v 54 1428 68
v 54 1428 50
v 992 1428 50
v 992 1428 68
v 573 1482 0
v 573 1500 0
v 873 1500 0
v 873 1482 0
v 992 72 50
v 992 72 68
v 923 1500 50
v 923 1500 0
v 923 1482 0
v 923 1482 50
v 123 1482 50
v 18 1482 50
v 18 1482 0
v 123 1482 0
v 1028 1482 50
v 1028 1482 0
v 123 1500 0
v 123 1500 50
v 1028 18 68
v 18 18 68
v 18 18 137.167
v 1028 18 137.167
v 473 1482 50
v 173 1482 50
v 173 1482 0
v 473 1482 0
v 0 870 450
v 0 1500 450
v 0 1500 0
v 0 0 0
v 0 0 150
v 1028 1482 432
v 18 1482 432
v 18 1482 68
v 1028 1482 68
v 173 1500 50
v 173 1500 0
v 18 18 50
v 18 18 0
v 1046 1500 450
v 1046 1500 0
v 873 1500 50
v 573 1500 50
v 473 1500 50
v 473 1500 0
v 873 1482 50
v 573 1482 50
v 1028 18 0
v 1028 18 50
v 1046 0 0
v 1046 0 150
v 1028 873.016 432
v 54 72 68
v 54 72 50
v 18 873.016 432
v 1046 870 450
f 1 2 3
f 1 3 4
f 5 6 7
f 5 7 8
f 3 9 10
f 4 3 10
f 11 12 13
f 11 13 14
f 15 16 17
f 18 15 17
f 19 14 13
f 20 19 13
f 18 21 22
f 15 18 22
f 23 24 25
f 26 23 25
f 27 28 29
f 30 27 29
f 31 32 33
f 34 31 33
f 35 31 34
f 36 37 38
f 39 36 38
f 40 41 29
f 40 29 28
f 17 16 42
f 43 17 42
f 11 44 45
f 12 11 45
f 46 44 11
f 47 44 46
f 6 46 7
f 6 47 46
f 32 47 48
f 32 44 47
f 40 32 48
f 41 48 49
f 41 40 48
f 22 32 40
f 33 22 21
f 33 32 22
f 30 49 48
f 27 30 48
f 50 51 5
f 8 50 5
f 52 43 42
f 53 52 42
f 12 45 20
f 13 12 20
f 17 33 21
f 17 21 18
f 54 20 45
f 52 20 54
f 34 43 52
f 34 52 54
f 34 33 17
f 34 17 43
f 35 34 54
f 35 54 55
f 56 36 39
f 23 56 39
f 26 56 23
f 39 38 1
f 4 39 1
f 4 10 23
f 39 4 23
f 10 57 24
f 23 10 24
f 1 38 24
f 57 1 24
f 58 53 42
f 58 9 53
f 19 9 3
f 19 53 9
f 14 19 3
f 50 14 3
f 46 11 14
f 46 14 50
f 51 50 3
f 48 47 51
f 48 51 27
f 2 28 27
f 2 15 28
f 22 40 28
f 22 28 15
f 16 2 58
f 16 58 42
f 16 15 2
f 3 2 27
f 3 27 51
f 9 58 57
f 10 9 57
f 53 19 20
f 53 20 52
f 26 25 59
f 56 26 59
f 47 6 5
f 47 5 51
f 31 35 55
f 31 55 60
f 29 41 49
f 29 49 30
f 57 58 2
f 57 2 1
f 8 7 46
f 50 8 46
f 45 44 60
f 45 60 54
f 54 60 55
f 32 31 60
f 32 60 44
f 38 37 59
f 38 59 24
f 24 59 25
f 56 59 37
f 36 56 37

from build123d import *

# Parameters (mm, degrees)
PAD021_DEPTH    = 1046
THICKNESS001_T  = -18
SKETCH040_W     = 50
SKETCH040_H     = 50
SKETCH040_W_2   = 100
POCKET001_DEPTH = 18
SKETCH048_W     = 36
SKETCH048_H     = 18
PAD028_DEPTH    = 1464
SKETCH049_W     = 54
SKETCH049_H     = 18
PAD029_DEPTH    = 1010


with BuildPart() as part:
    # Sketch039 → Pad021 (new body)
    with BuildSketch(Plane.YZ):
        Polygon((0, 0), (0, 150), (870, 450), (1500, 450), (1500, 0), align=None)
    extrude(amount=PAD021_DEPTH)

    # Thickness001
    thickness001_openings = [part.faces().sort_by_distance(p)[0] for p in [
        (523, 750, 0),
    ]]
    offset(amount=THICKNESS001_T, openings=thickness001_openings)

    # Sketch040 → Pocket001 (cut)
    with BuildSketch(Plane(origin=(0, 1500, 0), x_dir=(-1, 0, 0), z_dir=(0, 1, 0))):
        with Locations((-898, 25)):
            Rectangle(SKETCH040_W, SKETCH040_H)
        with Locations((-148, 25)):
            Rectangle(SKETCH040_W, SKETCH040_H)
        with Locations((-523, 25)):
            Rectangle(SKETCH040_W_2, SKETCH040_H)
    extrude(amount=-POCKET001_DEPTH, mode=Mode.SUBTRACT)

    # Sketch048 → Pad028 (new body)
    with BuildSketch(Plane(origin=(0, 18, 0), x_dir=(-1, 0, 0), z_dir=(0, 1, 0))):
        with Locations((-1010, 59)):
            Rectangle(SKETCH048_W, SKETCH048_H)
        with Locations((-36, 59)):
            Rectangle(SKETCH048_W, SKETCH048_H)
    extrude(amount=PAD028_DEPTH)

    # Sketch049 → Pad029 (new body)
    with BuildSketch(Plane(origin=(0, 0, 0), x_dir=(0, -1, 0), z_dir=(-1, 0, 0))):
        with Locations((-45, 59)):
            Rectangle(SKETCH049_W, SKETCH049_H)
        with Locations((-1455, 59)):
            Rectangle(SKETCH049_W, SKETCH049_H)
    extrude(amount=-PAD029_DEPTH)


solid = part.part
